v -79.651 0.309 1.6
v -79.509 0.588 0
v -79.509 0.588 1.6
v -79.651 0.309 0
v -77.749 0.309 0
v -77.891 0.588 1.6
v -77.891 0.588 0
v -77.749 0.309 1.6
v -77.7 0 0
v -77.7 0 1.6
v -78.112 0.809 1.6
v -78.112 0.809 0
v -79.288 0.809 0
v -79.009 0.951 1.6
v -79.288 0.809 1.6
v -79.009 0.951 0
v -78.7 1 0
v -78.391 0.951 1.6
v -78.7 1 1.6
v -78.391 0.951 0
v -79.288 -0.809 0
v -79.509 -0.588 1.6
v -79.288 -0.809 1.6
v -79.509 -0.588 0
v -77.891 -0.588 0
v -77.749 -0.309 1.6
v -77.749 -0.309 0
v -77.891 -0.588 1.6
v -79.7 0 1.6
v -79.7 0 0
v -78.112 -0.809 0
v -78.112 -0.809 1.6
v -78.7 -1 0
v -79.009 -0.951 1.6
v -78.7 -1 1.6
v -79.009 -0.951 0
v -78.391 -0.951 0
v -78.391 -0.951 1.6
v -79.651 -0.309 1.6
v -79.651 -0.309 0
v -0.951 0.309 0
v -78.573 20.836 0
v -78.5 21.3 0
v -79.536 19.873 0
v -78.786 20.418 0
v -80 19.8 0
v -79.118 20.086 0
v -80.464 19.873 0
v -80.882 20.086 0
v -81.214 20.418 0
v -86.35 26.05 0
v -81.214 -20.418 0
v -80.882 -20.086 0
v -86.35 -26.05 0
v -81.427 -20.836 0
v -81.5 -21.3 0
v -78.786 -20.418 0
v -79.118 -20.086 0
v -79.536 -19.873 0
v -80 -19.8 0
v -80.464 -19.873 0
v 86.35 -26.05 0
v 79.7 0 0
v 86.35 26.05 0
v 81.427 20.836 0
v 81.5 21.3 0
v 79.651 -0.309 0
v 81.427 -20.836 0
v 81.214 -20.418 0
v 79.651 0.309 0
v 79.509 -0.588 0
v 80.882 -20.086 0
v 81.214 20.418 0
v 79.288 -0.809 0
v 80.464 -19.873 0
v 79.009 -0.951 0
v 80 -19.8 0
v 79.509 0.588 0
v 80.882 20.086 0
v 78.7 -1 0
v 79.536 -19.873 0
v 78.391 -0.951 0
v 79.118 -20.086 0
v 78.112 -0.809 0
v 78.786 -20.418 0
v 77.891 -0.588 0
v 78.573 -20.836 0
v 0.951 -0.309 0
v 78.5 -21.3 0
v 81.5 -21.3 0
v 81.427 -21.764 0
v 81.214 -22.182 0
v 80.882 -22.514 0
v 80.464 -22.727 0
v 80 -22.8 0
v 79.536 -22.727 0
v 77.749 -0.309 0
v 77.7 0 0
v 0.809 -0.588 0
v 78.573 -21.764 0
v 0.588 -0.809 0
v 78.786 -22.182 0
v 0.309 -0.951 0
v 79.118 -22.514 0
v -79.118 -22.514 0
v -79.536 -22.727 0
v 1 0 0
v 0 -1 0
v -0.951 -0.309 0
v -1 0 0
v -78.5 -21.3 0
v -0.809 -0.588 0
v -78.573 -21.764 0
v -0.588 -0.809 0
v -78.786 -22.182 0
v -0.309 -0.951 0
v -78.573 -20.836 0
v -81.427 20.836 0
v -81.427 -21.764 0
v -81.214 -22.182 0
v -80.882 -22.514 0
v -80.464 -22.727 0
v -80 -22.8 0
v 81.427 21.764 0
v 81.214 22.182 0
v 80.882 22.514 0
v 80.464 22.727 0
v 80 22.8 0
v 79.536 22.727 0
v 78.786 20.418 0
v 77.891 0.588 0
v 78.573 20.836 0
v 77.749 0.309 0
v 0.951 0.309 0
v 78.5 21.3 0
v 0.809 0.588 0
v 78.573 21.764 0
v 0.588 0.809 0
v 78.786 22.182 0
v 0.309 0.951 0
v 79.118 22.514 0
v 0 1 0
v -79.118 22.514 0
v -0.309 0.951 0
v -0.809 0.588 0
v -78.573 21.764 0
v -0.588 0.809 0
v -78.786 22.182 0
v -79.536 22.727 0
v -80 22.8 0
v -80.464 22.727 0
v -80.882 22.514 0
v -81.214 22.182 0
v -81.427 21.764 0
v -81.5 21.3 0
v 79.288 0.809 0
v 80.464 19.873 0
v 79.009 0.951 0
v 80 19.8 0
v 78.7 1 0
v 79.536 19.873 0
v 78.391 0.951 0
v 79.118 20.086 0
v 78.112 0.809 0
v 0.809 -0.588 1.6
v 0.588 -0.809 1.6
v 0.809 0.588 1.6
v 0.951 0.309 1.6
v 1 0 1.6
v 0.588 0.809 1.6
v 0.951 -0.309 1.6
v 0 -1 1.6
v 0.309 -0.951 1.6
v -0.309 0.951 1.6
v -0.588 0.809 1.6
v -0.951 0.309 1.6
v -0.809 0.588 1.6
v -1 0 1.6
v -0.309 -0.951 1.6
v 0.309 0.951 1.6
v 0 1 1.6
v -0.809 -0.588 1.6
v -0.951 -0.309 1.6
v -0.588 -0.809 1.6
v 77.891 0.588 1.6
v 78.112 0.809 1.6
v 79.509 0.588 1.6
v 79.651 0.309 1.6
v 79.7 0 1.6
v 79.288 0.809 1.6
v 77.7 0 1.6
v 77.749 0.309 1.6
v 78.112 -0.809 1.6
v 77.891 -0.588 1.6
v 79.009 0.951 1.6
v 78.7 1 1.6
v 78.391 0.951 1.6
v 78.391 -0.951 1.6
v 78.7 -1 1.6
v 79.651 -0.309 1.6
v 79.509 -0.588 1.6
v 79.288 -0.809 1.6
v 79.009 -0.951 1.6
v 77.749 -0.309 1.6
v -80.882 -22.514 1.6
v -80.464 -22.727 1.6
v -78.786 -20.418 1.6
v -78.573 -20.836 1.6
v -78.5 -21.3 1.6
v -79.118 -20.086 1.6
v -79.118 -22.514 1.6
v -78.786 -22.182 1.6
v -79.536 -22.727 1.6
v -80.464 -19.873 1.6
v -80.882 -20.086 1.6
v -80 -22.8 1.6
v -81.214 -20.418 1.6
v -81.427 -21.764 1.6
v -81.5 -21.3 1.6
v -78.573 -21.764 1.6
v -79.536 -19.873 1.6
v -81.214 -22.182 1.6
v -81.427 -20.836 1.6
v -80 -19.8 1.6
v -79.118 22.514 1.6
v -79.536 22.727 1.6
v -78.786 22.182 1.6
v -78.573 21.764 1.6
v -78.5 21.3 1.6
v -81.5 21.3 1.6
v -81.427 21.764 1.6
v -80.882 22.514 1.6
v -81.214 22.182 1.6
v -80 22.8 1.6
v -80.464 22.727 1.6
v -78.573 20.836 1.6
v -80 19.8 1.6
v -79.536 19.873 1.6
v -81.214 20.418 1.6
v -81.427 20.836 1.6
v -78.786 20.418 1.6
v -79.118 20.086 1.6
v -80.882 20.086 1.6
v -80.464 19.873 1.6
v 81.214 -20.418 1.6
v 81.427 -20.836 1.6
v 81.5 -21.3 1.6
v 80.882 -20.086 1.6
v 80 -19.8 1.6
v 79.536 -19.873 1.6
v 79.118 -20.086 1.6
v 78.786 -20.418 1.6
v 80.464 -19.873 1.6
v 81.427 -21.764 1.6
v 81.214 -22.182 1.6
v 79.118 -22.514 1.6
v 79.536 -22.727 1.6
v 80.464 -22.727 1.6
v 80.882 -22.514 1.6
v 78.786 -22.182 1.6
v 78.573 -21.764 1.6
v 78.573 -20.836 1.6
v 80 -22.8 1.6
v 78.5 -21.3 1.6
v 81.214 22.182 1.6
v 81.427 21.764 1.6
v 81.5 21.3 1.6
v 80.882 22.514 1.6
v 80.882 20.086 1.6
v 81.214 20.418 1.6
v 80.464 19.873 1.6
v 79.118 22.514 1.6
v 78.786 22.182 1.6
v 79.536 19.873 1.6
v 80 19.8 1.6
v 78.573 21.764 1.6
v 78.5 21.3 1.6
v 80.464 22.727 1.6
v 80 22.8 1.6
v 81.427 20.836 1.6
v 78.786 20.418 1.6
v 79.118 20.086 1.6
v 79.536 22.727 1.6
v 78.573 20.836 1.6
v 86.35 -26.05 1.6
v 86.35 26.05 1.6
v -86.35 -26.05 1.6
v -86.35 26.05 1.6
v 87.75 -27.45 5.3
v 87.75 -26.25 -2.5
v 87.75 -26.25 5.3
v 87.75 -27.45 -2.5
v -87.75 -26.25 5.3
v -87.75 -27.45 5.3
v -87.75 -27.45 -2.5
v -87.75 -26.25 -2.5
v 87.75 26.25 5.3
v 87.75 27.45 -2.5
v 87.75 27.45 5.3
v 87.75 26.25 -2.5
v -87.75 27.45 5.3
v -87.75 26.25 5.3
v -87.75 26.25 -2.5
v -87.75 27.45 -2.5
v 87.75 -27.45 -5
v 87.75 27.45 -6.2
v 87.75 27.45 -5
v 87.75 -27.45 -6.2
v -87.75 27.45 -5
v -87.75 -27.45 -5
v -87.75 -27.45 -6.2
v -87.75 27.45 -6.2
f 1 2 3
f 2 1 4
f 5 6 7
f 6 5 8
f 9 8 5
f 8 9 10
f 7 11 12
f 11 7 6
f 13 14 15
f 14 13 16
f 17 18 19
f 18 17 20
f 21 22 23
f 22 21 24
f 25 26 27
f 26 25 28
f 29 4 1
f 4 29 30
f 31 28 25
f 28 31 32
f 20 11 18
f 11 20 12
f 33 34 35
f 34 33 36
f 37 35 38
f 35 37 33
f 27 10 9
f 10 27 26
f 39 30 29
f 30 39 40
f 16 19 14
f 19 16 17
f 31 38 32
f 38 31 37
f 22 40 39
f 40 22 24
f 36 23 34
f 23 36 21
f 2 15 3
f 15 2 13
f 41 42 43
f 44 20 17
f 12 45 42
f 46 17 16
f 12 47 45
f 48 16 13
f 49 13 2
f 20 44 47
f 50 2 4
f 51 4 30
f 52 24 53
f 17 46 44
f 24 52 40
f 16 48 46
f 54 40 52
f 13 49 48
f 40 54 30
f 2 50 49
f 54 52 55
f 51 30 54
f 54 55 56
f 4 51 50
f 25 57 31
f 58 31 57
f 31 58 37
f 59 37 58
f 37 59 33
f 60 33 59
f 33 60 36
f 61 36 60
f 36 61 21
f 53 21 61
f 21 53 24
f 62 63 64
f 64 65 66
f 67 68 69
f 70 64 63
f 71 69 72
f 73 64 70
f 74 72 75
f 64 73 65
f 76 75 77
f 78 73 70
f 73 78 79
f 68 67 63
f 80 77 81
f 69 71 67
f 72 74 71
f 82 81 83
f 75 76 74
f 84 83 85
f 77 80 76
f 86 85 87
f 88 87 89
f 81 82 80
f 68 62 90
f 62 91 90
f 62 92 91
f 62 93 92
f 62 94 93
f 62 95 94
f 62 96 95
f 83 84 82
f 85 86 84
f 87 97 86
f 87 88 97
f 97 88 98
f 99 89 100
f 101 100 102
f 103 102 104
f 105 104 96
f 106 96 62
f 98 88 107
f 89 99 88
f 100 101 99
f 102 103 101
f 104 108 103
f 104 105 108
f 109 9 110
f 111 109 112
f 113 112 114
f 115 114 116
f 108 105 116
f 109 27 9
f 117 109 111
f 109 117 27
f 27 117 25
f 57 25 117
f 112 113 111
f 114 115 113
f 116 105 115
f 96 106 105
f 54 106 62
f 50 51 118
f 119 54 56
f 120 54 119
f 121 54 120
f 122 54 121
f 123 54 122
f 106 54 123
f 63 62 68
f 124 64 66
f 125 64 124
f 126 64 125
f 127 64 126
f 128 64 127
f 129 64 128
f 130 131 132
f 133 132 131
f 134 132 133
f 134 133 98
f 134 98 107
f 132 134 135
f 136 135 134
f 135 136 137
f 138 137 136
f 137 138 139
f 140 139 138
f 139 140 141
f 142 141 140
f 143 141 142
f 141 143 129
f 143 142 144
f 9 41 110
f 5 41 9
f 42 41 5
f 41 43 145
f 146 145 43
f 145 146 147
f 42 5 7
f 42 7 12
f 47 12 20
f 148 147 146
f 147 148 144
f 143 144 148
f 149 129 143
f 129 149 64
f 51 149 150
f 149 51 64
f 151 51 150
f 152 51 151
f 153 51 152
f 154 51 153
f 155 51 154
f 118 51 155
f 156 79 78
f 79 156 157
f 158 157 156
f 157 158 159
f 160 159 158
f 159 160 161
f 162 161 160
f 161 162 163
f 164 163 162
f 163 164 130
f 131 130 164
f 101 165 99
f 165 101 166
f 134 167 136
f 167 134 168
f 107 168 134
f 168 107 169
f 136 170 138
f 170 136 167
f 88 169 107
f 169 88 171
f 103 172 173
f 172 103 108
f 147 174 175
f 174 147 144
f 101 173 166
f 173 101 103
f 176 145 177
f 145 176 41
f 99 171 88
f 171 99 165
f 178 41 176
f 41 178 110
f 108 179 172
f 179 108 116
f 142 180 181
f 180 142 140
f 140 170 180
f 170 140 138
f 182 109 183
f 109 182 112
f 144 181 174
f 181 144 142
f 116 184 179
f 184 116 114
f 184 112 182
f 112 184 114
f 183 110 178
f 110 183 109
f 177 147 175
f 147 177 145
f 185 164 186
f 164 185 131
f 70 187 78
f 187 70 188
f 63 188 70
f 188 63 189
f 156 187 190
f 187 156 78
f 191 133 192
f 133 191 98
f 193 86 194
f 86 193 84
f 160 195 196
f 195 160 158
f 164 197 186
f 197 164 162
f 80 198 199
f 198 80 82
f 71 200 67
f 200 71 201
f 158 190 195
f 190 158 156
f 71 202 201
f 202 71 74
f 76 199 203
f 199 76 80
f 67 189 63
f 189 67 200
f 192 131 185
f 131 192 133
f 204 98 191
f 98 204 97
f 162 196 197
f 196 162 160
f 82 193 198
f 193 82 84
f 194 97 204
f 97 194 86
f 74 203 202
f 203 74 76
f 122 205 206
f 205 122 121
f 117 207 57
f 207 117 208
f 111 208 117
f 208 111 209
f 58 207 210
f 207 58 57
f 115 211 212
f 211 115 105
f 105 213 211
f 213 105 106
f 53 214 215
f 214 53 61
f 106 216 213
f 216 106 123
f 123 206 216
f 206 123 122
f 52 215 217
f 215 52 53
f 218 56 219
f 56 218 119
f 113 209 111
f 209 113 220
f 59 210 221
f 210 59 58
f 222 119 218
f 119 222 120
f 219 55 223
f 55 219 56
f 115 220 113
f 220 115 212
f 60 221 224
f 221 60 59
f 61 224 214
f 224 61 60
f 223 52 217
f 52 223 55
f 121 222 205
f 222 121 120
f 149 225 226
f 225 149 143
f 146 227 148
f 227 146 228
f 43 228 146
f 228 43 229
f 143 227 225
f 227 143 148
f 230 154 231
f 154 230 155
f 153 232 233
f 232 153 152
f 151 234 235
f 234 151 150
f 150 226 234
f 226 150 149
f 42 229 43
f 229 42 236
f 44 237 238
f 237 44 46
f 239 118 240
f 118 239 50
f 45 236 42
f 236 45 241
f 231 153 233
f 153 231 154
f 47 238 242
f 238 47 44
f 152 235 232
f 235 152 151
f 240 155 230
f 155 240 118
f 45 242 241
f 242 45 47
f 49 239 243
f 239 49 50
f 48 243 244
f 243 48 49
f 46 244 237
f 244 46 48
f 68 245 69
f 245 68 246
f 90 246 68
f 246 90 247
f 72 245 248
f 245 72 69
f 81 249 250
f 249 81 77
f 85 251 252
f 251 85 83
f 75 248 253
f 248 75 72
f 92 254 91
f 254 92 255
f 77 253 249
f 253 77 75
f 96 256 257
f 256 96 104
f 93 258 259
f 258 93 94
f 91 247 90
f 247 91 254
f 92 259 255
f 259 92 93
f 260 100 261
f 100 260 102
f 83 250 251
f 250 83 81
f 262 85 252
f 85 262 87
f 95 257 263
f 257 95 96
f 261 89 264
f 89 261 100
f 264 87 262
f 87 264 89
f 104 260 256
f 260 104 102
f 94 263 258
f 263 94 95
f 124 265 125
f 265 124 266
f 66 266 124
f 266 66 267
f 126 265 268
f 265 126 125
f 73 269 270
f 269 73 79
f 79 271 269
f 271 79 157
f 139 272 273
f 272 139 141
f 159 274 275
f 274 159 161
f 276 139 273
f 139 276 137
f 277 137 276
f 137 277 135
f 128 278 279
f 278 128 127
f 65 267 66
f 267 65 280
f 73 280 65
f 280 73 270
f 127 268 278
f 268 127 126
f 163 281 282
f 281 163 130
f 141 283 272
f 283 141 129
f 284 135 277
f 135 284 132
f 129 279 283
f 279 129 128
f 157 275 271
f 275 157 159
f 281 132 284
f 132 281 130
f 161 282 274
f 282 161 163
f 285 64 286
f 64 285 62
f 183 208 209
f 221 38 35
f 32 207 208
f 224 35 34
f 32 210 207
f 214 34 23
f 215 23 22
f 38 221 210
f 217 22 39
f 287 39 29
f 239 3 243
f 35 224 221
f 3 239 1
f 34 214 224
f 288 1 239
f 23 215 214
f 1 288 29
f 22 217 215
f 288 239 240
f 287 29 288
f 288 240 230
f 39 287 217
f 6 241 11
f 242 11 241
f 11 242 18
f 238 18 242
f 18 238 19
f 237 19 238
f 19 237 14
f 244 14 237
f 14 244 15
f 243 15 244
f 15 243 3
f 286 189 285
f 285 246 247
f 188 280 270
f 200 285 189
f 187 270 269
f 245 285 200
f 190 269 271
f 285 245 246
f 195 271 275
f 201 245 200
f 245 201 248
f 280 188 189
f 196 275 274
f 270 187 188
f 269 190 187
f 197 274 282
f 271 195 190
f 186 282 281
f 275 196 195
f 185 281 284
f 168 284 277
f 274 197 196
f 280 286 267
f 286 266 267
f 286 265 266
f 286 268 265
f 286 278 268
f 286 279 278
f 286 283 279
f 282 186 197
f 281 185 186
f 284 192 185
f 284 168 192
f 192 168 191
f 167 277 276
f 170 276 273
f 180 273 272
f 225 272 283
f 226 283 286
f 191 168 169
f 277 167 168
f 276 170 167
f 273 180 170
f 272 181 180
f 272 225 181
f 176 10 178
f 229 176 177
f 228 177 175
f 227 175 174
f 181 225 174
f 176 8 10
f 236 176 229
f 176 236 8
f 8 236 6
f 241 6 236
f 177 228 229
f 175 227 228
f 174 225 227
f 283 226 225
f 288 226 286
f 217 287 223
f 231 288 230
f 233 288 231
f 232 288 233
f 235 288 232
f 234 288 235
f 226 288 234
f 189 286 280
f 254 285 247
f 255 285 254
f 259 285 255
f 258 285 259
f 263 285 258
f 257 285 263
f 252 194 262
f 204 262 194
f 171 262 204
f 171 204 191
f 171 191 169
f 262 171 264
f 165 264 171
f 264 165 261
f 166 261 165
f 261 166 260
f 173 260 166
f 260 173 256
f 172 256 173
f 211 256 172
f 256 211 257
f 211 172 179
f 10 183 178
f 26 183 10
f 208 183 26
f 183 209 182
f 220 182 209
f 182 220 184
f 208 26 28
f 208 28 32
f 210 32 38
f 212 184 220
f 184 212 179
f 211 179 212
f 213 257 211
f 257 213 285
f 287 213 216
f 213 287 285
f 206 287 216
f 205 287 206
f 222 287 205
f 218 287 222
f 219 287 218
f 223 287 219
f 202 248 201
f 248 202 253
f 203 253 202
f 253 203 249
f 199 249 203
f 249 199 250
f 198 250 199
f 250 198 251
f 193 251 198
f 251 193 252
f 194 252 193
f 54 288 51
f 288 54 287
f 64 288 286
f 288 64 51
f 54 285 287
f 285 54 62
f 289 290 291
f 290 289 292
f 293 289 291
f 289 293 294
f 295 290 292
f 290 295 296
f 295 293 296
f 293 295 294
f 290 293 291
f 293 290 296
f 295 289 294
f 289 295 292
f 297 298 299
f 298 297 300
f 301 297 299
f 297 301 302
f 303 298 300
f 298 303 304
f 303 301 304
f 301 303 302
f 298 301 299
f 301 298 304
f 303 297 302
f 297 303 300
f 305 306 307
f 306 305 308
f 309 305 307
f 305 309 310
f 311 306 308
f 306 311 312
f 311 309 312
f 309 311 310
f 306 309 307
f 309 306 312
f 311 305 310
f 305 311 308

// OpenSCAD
$fn = 20;

// dimemsions of the pcb board
W = 52.1;
L = 172.7;
T = 1.6;

GAP = 0.2;

X_HOLE_1 = 78.7;
X_HOLE_2 = 80;

D_HOLE_1 = 2;
D_HOLE_2 = 3;

Y_HOLE_1 = 35.6/2;
Y_HOLE_2 = 42.6/2;

H_TREY = 5;
T_WALL = 1.2;

module pbc_board(
    w=W,
    l=L,
    t=T,
    gap_b=H_TREY,
    xh_1=X_HOLE_1,
    xh_2=X_HOLE_2,
    dh_1=D_HOLE_1,
    dh_2=D_HOLE_2,
    yh_1=Y_HOLE_1,
    yh_2=Y_HOLE_2
) {
    color("#0A6F38")
    difference() {
        translate([0, 0, t / 2])
            cube([l,w,t], center=true);

        for(i=[-1,0,1]) {
            translate([i*xh_1, 0, 0])
                cylinder(d=dh_1, h=t+GAP);
        }
        for(i=[-1,1]) {
            for(j=[-1,1]) {
                translate([i*xh_2, j*yh_2, -GAP])
                    cylinder(d=dh_2, h=t+GAP*2);
            }
        }
    }
}


module pcb_base(
    w=W,
    l=L,
    t=T,
    h_trey=H_TREY,
    t_wall=T_WALL
) {
    base_x = l + 2 * t_wall + 2 * GAP;
    base_y = w + 2 * t_wall + 2 * GAP;
    translate_z = - t_wall / 2 - h_trey;

    fb_z = h_trey + t_wall + t;
    fb_translate_z = (t_wall + t)/2;

    color("#4a4646")
    union() {
        translate([0, 0, translate_z])
            cube([
                base_x,
                base_y,
                t_wall
            ], center = true);
        for(i=[-1,1]) {
            // front and back bookends
            scale([1,i,1])
            translate([0, base_y/2 - t_wall/2, fb_translate_z])
                cube([
                    base_x,
                    t_wall,
                    fb_z
                ], center = true);
        }
    }
}

pbc_board();
pcb_base();
